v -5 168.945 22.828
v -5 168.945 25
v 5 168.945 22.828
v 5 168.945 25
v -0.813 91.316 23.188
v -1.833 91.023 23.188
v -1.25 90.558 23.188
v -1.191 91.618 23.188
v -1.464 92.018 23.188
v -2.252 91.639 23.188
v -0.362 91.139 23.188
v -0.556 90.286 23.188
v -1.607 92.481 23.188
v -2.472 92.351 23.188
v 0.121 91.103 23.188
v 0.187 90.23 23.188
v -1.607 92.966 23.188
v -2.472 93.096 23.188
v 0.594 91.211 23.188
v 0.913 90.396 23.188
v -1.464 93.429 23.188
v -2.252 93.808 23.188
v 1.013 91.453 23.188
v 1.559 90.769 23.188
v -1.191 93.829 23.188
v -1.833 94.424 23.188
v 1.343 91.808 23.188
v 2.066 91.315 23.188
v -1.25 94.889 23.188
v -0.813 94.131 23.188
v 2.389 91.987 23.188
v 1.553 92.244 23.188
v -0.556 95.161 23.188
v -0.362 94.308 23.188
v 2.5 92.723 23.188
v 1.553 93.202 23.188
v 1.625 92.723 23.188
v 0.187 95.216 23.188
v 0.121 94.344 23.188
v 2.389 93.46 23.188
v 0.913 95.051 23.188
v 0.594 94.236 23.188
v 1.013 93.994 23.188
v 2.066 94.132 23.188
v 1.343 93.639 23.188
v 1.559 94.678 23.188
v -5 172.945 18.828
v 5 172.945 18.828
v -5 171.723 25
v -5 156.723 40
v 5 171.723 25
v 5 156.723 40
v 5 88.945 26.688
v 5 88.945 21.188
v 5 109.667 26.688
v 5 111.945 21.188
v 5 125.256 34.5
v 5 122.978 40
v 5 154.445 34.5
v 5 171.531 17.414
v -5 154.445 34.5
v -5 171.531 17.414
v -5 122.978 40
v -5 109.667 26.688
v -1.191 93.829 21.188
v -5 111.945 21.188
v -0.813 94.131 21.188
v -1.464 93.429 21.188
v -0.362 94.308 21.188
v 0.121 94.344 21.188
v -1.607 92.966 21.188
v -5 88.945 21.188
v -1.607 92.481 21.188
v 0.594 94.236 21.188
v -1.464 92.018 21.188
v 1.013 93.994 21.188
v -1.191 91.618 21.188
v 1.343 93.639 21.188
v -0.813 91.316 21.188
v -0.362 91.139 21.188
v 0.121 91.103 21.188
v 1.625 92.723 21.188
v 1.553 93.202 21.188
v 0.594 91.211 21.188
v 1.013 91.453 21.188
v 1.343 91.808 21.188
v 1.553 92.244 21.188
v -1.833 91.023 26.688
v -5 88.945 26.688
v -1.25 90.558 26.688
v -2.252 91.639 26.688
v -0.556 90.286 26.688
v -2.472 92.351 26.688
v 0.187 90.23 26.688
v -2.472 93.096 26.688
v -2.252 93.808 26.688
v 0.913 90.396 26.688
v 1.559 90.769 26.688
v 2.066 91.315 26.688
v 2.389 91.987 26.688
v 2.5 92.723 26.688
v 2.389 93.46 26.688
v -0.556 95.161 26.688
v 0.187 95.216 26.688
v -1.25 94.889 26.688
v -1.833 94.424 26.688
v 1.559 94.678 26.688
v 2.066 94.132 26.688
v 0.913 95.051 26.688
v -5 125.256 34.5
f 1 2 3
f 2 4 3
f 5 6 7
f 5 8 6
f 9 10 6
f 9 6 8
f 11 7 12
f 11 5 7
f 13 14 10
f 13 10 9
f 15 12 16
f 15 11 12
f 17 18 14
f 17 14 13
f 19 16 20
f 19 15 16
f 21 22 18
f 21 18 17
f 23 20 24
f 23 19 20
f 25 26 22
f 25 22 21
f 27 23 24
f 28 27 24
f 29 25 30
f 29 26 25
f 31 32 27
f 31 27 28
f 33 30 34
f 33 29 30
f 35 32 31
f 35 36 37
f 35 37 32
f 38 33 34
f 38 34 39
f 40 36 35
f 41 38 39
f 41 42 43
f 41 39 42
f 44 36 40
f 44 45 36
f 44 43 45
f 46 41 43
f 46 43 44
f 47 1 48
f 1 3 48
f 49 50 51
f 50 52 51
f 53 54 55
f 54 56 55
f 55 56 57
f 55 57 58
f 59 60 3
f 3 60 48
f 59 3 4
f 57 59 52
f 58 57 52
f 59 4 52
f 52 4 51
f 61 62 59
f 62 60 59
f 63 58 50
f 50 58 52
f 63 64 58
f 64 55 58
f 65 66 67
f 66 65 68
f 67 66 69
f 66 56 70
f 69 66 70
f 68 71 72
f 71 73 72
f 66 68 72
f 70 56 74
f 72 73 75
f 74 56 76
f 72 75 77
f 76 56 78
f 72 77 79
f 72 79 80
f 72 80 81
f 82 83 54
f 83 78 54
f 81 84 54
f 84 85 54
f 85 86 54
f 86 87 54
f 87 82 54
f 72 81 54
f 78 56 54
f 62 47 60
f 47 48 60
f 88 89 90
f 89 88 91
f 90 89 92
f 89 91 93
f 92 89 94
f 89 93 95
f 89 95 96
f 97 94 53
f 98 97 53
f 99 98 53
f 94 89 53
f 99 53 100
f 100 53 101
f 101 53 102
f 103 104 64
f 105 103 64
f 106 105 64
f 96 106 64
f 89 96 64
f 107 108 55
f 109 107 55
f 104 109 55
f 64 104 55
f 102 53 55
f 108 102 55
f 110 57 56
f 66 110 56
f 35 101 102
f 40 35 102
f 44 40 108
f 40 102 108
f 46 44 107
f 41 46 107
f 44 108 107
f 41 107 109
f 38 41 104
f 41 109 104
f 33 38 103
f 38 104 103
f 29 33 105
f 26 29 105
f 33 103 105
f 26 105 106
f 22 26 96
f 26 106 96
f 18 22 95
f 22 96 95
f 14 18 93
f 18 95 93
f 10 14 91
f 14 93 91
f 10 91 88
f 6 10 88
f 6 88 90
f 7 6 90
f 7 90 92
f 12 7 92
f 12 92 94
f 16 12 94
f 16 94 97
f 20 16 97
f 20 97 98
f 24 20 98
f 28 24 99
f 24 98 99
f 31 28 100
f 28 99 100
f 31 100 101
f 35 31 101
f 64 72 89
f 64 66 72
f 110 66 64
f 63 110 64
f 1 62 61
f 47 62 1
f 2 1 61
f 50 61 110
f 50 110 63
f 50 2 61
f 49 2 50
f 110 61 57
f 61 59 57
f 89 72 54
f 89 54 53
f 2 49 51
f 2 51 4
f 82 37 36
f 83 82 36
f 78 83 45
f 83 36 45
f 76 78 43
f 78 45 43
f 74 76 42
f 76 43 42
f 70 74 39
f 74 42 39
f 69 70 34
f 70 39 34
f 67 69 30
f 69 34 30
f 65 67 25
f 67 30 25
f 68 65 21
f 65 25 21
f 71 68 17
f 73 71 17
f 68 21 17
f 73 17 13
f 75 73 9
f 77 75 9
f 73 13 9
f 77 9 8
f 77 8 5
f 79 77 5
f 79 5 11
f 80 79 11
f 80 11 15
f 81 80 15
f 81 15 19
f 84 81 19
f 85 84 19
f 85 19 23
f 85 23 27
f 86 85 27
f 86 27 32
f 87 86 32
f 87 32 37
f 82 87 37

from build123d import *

# Parameters (mm, degrees)
ESTRUSIONE_ESTRUSIONE1_DEPTH = 5
SCHIZZO2_R                   = 1.625
TAGLIO_ESTRUSIONE1_DEPTH     = 10.274243706
SCHIZZO3_R                   = 2.5
TAGLIO_ESTRUSIONE2_DEPTH     = 3.5


with BuildPart() as part:
    # Schizzo1 → Estrusione-Estrusione1 (new body, symmetric)
    with BuildSketch(Plane(origin=(0, 0, 0), x_dir=(0, 0, -1), z_dir=(1, 0, 0))):
        Polygon((-21.188457268, 88.94490566), (-26.688457268, 88.94490566), (-26.688457268, 109.666731067), (-40, 122.978273799), (-40, 156.723080253), (-25, 171.723080253), (-25, 168.94490566), (-22.828427125, 168.94490566), (-18.828427125, 172.94490566), (-17.414213562, 171.530692098), (-34.5, 154.44490566), (-34.5, 125.256448392), (-21.188457268, 111.94490566), align=None)
    extrude(amount=ESTRUSIONE_ESTRUSIONE1_DEPTH, both=True)

    # Schizzo2 → Taglio-Estrusione1 (cut, through all)
    with BuildSketch(Plane.XY.offset(26.688457268)):
        with Locations((0, 92.723474812)):
            Circle(SCHIZZO2_R)
    extrude(amount=-TAGLIO_ESTRUSIONE1_DEPTH, mode=Mode.SUBTRACT)

    # Schizzo3 → Taglio-Estrusione2 (cut)
    with BuildSketch(Plane.XY.offset(26.688457268)):
        with Locations((0, 92.723474812)):
            Circle(SCHIZZO3_R)
    extrude(amount=-TAGLIO_ESTRUSIONE2_DEPTH, mode=Mode.SUBTRACT)


solid = part.part
